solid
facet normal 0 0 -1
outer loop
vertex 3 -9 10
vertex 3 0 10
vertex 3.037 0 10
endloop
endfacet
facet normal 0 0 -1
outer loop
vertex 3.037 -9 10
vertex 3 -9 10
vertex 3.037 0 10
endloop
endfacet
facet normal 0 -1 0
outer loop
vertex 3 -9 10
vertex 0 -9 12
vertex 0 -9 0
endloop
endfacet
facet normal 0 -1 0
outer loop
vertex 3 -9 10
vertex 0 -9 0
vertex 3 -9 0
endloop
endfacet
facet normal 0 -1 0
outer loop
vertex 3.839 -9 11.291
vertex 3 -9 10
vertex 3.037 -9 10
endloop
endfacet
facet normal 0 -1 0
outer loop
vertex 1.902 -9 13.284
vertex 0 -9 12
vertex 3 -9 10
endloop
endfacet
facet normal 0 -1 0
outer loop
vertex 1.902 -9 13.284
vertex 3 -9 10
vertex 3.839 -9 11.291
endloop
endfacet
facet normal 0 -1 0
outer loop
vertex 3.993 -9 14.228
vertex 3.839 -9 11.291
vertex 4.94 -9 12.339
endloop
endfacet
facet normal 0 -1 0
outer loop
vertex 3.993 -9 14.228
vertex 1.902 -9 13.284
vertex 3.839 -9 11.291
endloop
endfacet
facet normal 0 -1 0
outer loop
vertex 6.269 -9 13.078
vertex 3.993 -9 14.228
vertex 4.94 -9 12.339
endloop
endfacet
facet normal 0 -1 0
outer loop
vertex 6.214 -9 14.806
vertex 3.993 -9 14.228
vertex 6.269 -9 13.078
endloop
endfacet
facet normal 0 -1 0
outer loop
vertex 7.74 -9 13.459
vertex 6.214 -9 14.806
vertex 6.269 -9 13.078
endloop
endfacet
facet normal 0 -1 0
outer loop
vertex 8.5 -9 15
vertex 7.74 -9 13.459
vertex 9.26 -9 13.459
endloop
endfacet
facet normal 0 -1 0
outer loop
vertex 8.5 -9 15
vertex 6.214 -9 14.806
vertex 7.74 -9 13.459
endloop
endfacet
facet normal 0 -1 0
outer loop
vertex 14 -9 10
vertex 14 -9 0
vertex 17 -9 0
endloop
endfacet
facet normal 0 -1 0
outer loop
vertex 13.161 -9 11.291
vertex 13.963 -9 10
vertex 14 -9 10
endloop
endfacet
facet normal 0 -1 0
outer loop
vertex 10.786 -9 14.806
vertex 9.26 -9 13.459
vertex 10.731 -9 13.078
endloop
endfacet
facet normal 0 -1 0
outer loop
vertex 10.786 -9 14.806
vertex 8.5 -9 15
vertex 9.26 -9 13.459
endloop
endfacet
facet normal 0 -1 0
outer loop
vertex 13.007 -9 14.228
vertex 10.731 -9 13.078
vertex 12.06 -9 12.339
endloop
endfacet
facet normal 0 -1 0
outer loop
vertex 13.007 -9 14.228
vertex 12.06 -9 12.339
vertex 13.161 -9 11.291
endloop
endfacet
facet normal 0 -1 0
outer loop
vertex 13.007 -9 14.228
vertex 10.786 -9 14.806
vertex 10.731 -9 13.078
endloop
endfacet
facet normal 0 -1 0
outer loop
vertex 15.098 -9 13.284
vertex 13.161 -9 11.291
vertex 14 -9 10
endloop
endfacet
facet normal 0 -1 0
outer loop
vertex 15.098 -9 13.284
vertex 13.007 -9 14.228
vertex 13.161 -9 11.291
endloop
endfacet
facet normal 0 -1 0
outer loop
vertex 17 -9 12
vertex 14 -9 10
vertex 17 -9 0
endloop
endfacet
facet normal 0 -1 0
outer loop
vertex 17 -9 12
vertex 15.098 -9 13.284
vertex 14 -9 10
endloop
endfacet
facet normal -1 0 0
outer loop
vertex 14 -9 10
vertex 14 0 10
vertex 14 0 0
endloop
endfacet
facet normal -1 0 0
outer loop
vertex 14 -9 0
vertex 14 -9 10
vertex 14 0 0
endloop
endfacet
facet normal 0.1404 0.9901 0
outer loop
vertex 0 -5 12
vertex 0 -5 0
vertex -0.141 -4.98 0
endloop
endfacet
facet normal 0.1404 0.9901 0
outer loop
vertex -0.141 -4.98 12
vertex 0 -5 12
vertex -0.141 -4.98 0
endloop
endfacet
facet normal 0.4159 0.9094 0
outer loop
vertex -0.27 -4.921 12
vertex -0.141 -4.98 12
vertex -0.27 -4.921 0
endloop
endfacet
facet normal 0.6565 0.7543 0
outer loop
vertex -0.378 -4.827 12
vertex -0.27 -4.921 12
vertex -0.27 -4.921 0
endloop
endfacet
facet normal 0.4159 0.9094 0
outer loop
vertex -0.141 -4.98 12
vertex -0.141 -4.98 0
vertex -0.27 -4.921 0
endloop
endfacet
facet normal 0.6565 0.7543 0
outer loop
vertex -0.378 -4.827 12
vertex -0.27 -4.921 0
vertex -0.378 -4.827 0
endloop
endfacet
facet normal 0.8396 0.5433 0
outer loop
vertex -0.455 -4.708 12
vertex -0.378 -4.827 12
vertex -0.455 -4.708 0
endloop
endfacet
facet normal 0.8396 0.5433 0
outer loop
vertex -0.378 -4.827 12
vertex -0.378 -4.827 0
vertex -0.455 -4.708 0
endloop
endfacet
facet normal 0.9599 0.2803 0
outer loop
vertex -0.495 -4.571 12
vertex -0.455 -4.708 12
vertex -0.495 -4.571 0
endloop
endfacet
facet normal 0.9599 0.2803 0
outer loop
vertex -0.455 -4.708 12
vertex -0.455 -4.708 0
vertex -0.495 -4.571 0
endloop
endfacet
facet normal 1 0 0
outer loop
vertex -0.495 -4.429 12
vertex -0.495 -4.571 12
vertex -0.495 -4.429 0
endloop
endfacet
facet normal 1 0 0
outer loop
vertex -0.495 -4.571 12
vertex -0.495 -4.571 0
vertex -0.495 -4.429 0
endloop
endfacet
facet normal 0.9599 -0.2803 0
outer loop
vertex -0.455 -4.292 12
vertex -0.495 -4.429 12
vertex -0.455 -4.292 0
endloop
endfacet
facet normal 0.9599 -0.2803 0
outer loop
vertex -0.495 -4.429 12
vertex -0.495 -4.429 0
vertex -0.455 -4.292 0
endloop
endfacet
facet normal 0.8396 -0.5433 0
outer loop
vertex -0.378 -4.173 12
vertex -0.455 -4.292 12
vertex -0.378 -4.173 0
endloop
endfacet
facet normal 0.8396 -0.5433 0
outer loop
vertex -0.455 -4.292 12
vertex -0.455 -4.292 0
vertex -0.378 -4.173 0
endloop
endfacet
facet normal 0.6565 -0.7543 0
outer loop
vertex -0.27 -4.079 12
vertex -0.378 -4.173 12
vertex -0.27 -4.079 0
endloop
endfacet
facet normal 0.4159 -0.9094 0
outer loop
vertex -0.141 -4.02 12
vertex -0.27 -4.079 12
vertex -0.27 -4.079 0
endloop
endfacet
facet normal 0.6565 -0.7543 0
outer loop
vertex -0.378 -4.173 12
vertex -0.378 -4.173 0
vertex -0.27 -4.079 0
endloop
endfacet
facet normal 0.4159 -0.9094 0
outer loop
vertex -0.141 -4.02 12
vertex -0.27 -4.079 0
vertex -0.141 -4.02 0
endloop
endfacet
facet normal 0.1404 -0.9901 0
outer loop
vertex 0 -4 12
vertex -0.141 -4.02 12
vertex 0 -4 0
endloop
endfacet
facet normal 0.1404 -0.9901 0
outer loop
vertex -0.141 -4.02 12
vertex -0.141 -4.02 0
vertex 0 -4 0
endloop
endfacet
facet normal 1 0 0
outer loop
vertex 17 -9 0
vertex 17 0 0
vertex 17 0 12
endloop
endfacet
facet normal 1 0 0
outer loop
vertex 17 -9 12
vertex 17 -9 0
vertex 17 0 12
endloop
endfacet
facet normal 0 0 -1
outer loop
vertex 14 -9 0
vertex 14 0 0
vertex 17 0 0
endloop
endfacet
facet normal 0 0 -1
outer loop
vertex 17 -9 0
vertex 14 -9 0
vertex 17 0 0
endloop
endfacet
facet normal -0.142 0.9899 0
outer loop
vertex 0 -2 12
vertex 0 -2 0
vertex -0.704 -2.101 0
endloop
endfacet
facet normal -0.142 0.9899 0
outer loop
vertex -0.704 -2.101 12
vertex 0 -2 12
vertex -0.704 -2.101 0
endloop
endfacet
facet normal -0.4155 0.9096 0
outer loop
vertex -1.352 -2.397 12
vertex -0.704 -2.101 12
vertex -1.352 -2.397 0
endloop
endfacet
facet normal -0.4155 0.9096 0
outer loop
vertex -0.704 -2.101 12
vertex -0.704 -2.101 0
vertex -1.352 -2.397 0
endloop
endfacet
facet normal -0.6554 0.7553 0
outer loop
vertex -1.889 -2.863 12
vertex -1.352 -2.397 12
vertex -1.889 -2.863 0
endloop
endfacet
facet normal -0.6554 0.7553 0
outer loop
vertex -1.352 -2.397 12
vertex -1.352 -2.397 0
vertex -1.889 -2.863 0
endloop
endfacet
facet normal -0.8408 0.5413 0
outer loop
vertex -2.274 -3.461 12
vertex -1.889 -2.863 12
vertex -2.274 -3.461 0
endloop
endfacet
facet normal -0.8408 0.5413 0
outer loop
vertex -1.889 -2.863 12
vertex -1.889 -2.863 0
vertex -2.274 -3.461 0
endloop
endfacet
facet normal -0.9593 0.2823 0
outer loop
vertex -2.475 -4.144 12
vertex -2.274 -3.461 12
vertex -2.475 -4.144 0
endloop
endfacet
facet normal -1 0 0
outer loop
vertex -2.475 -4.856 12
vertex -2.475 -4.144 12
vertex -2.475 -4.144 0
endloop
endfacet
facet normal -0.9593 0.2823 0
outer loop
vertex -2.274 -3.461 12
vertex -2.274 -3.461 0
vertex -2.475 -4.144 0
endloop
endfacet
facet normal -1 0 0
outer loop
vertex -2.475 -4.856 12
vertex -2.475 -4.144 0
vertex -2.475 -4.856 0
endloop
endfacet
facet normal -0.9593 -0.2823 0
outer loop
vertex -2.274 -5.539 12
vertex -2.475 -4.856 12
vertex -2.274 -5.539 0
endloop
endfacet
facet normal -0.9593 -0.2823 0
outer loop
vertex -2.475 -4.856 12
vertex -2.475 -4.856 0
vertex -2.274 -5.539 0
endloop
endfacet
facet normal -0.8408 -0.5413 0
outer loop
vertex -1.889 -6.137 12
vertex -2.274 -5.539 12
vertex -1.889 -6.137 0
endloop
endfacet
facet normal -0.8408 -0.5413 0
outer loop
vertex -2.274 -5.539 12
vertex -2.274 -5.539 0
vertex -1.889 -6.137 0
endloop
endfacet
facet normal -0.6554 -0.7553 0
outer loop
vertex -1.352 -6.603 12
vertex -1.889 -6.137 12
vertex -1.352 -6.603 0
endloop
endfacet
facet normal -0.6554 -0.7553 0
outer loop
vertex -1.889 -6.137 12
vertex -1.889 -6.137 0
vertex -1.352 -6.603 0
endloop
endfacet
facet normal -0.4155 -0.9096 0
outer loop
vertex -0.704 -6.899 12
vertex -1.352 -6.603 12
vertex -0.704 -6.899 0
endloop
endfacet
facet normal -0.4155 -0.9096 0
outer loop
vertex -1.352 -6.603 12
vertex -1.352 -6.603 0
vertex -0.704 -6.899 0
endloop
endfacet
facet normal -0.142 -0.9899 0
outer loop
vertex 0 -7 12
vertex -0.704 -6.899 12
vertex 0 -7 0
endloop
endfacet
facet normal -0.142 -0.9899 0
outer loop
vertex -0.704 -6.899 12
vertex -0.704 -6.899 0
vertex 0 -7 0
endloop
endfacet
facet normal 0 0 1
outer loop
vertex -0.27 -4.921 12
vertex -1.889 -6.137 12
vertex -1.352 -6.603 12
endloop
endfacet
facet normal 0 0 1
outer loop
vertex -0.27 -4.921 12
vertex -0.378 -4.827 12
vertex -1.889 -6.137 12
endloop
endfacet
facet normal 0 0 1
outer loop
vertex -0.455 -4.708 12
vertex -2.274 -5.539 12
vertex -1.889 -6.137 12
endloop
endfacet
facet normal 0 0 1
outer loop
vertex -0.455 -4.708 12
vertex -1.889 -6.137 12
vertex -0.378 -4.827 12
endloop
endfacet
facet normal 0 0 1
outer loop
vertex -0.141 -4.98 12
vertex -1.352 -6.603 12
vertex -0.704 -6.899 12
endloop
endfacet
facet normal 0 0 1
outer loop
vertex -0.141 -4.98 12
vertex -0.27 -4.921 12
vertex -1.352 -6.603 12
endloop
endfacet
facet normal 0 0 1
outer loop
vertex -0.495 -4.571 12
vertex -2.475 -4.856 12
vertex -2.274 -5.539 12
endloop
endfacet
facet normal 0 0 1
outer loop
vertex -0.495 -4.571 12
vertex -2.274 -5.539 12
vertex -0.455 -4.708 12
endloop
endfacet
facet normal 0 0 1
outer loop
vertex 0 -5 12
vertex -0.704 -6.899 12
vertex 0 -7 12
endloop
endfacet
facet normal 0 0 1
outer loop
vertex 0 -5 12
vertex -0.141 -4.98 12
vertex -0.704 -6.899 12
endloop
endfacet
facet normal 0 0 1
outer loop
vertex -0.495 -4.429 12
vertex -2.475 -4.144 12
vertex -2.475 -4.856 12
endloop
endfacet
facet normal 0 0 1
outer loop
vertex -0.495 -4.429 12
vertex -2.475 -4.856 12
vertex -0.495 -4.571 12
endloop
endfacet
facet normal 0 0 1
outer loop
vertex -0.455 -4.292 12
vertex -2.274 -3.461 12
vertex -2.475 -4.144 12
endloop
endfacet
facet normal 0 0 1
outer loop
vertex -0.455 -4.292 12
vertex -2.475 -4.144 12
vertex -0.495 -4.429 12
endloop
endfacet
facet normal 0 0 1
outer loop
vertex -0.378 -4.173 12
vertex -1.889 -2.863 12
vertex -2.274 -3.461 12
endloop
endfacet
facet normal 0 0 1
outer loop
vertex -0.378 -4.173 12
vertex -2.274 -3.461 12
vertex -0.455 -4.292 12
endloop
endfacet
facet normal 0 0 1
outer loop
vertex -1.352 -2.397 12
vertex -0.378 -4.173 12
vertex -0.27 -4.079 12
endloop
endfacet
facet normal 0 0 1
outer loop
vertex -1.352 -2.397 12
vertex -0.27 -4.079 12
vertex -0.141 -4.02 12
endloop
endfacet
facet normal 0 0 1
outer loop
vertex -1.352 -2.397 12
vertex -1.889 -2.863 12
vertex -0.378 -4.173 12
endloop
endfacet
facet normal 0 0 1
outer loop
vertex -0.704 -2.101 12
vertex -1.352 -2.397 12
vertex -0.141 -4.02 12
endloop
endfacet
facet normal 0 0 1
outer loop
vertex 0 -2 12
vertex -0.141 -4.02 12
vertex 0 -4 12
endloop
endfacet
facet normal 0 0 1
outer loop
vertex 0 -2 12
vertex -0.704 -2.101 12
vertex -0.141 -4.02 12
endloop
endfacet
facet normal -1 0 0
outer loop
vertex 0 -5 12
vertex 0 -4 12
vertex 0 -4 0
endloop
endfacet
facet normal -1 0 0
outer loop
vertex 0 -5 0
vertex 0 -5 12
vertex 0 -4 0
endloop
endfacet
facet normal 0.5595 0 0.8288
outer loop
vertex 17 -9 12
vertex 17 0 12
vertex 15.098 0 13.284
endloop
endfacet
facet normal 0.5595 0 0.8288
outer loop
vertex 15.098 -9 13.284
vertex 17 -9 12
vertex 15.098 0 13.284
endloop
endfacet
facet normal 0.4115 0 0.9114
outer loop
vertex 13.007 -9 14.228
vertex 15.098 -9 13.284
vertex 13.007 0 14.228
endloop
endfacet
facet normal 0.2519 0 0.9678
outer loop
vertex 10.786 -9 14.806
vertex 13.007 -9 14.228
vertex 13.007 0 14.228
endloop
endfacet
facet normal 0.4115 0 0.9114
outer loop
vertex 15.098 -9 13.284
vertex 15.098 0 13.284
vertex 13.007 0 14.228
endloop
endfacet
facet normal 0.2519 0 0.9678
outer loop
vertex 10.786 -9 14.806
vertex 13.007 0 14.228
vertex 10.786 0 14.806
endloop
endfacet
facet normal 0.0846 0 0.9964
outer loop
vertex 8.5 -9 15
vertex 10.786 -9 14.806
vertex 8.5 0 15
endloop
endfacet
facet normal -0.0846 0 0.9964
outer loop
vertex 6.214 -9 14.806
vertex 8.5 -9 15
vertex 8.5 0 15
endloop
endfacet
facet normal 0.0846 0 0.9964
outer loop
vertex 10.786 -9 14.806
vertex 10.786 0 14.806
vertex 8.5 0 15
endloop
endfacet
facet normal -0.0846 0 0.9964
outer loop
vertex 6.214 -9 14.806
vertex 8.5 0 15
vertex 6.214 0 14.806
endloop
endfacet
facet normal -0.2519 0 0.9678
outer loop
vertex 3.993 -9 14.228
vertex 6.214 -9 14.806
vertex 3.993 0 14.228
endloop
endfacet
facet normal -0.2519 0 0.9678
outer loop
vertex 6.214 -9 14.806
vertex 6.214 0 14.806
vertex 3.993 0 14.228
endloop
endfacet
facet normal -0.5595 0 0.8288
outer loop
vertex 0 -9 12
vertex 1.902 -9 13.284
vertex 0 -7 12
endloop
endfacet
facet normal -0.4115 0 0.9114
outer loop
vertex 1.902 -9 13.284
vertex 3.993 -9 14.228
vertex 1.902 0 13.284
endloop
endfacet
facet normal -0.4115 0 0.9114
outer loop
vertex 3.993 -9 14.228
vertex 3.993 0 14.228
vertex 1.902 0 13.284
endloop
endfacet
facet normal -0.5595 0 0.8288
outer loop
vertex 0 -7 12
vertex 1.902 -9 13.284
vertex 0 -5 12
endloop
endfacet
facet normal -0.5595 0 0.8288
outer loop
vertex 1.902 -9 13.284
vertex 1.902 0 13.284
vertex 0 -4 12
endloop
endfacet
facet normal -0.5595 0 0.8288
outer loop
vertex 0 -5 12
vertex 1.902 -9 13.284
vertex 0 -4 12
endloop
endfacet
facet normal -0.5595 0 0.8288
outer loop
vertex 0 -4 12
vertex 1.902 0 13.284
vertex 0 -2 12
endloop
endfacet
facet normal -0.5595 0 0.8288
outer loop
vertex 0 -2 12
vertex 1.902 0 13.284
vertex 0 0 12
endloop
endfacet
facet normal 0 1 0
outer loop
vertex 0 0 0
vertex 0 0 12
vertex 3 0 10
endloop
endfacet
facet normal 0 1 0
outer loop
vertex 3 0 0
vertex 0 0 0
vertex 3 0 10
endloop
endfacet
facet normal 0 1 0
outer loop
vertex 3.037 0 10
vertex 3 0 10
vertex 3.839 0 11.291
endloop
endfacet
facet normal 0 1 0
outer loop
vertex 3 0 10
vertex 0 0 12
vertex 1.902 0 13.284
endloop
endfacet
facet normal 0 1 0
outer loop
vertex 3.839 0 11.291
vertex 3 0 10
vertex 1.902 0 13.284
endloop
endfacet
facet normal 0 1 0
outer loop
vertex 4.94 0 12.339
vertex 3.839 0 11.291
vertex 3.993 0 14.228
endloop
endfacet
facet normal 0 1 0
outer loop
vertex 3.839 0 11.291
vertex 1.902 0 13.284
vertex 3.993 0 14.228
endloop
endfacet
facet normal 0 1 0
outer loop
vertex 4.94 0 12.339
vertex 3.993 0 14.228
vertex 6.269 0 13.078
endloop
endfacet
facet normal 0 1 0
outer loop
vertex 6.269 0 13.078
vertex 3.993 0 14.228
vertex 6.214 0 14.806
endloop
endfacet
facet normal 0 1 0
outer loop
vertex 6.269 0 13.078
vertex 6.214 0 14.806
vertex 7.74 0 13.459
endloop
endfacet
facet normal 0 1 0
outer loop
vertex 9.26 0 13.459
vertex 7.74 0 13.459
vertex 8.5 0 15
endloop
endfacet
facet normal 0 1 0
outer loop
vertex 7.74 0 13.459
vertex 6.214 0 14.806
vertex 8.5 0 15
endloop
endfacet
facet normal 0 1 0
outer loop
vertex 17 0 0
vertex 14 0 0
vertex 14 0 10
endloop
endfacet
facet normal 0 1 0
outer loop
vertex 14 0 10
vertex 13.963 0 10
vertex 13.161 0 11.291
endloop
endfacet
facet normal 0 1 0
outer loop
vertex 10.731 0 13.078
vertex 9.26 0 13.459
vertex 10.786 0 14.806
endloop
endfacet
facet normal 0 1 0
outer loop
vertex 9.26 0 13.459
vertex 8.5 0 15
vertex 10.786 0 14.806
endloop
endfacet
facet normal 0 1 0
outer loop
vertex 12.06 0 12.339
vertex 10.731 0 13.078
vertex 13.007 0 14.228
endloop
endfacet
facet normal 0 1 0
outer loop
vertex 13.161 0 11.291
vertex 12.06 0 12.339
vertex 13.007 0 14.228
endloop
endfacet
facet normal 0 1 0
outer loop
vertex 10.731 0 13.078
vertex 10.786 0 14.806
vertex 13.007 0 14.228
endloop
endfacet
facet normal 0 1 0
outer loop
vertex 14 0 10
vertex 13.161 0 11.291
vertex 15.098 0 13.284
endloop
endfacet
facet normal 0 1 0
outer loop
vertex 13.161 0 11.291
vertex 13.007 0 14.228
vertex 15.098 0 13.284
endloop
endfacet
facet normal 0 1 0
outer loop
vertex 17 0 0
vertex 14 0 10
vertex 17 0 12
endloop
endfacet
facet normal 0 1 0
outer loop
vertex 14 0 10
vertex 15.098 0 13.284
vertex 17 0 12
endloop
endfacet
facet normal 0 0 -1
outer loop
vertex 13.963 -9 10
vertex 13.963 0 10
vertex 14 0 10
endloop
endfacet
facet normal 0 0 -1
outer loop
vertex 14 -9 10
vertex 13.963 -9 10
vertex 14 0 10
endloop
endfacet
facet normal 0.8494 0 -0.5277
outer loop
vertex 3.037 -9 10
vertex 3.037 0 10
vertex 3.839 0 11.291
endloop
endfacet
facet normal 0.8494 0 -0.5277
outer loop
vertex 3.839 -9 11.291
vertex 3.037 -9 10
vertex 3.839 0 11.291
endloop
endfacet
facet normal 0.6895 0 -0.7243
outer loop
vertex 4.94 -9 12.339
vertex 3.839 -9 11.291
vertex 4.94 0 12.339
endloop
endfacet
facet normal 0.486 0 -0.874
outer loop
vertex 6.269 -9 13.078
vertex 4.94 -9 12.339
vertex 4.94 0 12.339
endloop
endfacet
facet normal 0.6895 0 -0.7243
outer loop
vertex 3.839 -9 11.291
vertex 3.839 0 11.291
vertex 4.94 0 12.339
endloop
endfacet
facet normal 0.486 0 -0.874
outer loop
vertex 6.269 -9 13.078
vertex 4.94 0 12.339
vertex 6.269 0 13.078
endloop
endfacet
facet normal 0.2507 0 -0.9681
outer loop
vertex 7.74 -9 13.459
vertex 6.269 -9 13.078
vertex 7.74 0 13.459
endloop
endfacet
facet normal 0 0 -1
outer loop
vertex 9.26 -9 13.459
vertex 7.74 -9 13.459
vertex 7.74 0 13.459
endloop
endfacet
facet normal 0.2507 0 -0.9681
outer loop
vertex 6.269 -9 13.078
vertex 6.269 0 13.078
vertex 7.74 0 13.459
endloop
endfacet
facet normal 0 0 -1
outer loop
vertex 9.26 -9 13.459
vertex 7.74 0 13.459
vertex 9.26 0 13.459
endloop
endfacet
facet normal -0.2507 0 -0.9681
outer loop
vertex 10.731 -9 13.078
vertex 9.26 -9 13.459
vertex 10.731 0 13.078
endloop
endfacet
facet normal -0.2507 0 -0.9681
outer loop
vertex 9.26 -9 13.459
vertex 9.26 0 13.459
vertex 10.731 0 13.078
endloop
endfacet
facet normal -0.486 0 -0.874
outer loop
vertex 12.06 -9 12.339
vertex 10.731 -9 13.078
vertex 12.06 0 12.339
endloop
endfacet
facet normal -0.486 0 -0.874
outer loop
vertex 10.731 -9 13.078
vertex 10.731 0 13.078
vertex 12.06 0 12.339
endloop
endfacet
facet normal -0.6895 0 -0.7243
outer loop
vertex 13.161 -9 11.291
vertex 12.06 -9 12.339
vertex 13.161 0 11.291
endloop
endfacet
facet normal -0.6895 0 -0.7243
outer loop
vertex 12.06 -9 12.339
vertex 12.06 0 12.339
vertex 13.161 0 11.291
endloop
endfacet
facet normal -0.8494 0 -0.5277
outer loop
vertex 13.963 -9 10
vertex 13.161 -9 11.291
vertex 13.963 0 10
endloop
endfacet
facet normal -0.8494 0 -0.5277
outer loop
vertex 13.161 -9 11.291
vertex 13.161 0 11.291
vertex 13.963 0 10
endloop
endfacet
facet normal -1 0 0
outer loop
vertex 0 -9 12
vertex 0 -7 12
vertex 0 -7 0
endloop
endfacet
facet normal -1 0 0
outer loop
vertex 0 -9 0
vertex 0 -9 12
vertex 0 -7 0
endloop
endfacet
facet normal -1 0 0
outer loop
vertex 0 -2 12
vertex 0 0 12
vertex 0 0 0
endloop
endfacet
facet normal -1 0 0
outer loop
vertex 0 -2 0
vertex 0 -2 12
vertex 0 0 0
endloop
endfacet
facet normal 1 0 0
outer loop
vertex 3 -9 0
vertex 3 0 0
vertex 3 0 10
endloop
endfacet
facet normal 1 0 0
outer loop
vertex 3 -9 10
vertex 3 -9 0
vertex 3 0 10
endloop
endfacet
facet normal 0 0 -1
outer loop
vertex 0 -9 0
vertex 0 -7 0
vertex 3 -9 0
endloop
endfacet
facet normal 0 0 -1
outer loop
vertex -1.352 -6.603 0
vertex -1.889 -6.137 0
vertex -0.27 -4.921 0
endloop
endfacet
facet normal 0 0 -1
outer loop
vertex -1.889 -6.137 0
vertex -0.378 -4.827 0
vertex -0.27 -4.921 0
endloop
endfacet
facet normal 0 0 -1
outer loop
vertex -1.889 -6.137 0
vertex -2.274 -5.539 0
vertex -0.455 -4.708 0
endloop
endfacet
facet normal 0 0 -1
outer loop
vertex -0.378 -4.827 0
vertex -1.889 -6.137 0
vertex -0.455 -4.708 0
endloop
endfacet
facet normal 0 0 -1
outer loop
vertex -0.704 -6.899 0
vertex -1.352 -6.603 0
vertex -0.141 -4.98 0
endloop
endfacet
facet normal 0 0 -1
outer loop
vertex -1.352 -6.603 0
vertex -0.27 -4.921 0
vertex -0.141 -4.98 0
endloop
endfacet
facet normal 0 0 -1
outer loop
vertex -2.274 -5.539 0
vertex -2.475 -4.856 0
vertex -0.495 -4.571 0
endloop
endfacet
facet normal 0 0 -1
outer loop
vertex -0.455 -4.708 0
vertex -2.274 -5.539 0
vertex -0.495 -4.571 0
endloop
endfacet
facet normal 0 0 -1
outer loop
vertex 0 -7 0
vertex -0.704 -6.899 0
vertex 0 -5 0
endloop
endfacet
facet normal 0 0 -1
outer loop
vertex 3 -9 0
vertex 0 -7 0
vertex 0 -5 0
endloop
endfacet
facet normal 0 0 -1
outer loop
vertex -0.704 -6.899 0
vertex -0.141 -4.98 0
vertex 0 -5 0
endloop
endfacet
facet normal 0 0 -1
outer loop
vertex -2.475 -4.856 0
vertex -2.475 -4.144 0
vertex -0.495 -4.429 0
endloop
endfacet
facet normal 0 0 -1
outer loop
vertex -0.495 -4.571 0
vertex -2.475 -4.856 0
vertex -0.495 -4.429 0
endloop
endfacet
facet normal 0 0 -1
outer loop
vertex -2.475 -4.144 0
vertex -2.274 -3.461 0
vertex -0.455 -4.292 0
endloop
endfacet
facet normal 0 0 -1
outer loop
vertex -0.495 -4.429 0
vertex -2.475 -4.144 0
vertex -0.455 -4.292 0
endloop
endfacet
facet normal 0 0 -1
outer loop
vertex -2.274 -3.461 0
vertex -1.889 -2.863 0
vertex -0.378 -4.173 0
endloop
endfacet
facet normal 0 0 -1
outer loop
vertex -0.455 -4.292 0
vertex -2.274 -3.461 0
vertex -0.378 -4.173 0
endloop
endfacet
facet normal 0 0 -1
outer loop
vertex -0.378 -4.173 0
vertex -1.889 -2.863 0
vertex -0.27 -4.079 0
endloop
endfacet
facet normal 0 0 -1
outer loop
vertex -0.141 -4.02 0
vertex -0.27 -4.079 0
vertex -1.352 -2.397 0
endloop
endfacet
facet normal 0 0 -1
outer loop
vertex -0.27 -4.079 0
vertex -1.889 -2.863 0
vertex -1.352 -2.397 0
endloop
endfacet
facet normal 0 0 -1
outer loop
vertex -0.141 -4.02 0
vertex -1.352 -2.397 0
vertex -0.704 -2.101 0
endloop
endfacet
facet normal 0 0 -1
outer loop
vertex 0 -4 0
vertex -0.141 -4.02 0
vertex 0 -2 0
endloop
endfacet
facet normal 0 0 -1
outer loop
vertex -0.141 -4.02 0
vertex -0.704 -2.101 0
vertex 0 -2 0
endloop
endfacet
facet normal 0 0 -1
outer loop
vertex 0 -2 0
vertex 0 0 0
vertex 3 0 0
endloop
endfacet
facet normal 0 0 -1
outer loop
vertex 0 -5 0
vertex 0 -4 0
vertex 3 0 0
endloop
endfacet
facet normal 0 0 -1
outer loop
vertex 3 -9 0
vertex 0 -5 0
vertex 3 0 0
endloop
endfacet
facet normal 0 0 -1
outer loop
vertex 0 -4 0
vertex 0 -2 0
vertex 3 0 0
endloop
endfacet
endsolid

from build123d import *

# Parameters (mm, degrees)
F1_DEPTH = 9
F3_DEPTH = 12


with BuildPart() as f1:
    # F0 (on Front) → F1 (new body)
    with BuildSketch(Plane.XZ):
        with BuildLine():
            Line((0, 12), (0, 0))
            Line((0, 0), (3, 0))
            Line((3, 0), (3, 9.9171948475))
            Line((3, 9.9171948475), (3, 10))
            Line((3, 10), (3.0371407733, 10))
            ThreePointArc((3.0371407733, 10), (8.5, 13.5077309303), (13.9628592267, 10))
            Line((13.9628592267, 10), (14, 10))
            Line((14, 10), (14, 9.9171948475))
            Line((14, 9.9171948475), (14, 0))
            Line((14, 0), (17, 0))
            Line((17, 0), (17, 12))
            ThreePointArc((17, 12), (8.5, 15), (0, 12))
        make_face()
    extrude(amount=F1_DEPTH)

    # F2 (on Top) → F3 (join)
    with BuildSketch(Plane.XY):
        with BuildLine():
            ThreePointArc((0, -2), (-2.5, -4.5), (0, -7))
            Line((0, -7), (0, -5))
            ThreePointArc((0, -5), (-0.5, -4.5), (0, -4))
            Line((0, -4), (0, -2))
        make_face()
    extrude(amount=F3_DEPTH)


solid = f1.part
